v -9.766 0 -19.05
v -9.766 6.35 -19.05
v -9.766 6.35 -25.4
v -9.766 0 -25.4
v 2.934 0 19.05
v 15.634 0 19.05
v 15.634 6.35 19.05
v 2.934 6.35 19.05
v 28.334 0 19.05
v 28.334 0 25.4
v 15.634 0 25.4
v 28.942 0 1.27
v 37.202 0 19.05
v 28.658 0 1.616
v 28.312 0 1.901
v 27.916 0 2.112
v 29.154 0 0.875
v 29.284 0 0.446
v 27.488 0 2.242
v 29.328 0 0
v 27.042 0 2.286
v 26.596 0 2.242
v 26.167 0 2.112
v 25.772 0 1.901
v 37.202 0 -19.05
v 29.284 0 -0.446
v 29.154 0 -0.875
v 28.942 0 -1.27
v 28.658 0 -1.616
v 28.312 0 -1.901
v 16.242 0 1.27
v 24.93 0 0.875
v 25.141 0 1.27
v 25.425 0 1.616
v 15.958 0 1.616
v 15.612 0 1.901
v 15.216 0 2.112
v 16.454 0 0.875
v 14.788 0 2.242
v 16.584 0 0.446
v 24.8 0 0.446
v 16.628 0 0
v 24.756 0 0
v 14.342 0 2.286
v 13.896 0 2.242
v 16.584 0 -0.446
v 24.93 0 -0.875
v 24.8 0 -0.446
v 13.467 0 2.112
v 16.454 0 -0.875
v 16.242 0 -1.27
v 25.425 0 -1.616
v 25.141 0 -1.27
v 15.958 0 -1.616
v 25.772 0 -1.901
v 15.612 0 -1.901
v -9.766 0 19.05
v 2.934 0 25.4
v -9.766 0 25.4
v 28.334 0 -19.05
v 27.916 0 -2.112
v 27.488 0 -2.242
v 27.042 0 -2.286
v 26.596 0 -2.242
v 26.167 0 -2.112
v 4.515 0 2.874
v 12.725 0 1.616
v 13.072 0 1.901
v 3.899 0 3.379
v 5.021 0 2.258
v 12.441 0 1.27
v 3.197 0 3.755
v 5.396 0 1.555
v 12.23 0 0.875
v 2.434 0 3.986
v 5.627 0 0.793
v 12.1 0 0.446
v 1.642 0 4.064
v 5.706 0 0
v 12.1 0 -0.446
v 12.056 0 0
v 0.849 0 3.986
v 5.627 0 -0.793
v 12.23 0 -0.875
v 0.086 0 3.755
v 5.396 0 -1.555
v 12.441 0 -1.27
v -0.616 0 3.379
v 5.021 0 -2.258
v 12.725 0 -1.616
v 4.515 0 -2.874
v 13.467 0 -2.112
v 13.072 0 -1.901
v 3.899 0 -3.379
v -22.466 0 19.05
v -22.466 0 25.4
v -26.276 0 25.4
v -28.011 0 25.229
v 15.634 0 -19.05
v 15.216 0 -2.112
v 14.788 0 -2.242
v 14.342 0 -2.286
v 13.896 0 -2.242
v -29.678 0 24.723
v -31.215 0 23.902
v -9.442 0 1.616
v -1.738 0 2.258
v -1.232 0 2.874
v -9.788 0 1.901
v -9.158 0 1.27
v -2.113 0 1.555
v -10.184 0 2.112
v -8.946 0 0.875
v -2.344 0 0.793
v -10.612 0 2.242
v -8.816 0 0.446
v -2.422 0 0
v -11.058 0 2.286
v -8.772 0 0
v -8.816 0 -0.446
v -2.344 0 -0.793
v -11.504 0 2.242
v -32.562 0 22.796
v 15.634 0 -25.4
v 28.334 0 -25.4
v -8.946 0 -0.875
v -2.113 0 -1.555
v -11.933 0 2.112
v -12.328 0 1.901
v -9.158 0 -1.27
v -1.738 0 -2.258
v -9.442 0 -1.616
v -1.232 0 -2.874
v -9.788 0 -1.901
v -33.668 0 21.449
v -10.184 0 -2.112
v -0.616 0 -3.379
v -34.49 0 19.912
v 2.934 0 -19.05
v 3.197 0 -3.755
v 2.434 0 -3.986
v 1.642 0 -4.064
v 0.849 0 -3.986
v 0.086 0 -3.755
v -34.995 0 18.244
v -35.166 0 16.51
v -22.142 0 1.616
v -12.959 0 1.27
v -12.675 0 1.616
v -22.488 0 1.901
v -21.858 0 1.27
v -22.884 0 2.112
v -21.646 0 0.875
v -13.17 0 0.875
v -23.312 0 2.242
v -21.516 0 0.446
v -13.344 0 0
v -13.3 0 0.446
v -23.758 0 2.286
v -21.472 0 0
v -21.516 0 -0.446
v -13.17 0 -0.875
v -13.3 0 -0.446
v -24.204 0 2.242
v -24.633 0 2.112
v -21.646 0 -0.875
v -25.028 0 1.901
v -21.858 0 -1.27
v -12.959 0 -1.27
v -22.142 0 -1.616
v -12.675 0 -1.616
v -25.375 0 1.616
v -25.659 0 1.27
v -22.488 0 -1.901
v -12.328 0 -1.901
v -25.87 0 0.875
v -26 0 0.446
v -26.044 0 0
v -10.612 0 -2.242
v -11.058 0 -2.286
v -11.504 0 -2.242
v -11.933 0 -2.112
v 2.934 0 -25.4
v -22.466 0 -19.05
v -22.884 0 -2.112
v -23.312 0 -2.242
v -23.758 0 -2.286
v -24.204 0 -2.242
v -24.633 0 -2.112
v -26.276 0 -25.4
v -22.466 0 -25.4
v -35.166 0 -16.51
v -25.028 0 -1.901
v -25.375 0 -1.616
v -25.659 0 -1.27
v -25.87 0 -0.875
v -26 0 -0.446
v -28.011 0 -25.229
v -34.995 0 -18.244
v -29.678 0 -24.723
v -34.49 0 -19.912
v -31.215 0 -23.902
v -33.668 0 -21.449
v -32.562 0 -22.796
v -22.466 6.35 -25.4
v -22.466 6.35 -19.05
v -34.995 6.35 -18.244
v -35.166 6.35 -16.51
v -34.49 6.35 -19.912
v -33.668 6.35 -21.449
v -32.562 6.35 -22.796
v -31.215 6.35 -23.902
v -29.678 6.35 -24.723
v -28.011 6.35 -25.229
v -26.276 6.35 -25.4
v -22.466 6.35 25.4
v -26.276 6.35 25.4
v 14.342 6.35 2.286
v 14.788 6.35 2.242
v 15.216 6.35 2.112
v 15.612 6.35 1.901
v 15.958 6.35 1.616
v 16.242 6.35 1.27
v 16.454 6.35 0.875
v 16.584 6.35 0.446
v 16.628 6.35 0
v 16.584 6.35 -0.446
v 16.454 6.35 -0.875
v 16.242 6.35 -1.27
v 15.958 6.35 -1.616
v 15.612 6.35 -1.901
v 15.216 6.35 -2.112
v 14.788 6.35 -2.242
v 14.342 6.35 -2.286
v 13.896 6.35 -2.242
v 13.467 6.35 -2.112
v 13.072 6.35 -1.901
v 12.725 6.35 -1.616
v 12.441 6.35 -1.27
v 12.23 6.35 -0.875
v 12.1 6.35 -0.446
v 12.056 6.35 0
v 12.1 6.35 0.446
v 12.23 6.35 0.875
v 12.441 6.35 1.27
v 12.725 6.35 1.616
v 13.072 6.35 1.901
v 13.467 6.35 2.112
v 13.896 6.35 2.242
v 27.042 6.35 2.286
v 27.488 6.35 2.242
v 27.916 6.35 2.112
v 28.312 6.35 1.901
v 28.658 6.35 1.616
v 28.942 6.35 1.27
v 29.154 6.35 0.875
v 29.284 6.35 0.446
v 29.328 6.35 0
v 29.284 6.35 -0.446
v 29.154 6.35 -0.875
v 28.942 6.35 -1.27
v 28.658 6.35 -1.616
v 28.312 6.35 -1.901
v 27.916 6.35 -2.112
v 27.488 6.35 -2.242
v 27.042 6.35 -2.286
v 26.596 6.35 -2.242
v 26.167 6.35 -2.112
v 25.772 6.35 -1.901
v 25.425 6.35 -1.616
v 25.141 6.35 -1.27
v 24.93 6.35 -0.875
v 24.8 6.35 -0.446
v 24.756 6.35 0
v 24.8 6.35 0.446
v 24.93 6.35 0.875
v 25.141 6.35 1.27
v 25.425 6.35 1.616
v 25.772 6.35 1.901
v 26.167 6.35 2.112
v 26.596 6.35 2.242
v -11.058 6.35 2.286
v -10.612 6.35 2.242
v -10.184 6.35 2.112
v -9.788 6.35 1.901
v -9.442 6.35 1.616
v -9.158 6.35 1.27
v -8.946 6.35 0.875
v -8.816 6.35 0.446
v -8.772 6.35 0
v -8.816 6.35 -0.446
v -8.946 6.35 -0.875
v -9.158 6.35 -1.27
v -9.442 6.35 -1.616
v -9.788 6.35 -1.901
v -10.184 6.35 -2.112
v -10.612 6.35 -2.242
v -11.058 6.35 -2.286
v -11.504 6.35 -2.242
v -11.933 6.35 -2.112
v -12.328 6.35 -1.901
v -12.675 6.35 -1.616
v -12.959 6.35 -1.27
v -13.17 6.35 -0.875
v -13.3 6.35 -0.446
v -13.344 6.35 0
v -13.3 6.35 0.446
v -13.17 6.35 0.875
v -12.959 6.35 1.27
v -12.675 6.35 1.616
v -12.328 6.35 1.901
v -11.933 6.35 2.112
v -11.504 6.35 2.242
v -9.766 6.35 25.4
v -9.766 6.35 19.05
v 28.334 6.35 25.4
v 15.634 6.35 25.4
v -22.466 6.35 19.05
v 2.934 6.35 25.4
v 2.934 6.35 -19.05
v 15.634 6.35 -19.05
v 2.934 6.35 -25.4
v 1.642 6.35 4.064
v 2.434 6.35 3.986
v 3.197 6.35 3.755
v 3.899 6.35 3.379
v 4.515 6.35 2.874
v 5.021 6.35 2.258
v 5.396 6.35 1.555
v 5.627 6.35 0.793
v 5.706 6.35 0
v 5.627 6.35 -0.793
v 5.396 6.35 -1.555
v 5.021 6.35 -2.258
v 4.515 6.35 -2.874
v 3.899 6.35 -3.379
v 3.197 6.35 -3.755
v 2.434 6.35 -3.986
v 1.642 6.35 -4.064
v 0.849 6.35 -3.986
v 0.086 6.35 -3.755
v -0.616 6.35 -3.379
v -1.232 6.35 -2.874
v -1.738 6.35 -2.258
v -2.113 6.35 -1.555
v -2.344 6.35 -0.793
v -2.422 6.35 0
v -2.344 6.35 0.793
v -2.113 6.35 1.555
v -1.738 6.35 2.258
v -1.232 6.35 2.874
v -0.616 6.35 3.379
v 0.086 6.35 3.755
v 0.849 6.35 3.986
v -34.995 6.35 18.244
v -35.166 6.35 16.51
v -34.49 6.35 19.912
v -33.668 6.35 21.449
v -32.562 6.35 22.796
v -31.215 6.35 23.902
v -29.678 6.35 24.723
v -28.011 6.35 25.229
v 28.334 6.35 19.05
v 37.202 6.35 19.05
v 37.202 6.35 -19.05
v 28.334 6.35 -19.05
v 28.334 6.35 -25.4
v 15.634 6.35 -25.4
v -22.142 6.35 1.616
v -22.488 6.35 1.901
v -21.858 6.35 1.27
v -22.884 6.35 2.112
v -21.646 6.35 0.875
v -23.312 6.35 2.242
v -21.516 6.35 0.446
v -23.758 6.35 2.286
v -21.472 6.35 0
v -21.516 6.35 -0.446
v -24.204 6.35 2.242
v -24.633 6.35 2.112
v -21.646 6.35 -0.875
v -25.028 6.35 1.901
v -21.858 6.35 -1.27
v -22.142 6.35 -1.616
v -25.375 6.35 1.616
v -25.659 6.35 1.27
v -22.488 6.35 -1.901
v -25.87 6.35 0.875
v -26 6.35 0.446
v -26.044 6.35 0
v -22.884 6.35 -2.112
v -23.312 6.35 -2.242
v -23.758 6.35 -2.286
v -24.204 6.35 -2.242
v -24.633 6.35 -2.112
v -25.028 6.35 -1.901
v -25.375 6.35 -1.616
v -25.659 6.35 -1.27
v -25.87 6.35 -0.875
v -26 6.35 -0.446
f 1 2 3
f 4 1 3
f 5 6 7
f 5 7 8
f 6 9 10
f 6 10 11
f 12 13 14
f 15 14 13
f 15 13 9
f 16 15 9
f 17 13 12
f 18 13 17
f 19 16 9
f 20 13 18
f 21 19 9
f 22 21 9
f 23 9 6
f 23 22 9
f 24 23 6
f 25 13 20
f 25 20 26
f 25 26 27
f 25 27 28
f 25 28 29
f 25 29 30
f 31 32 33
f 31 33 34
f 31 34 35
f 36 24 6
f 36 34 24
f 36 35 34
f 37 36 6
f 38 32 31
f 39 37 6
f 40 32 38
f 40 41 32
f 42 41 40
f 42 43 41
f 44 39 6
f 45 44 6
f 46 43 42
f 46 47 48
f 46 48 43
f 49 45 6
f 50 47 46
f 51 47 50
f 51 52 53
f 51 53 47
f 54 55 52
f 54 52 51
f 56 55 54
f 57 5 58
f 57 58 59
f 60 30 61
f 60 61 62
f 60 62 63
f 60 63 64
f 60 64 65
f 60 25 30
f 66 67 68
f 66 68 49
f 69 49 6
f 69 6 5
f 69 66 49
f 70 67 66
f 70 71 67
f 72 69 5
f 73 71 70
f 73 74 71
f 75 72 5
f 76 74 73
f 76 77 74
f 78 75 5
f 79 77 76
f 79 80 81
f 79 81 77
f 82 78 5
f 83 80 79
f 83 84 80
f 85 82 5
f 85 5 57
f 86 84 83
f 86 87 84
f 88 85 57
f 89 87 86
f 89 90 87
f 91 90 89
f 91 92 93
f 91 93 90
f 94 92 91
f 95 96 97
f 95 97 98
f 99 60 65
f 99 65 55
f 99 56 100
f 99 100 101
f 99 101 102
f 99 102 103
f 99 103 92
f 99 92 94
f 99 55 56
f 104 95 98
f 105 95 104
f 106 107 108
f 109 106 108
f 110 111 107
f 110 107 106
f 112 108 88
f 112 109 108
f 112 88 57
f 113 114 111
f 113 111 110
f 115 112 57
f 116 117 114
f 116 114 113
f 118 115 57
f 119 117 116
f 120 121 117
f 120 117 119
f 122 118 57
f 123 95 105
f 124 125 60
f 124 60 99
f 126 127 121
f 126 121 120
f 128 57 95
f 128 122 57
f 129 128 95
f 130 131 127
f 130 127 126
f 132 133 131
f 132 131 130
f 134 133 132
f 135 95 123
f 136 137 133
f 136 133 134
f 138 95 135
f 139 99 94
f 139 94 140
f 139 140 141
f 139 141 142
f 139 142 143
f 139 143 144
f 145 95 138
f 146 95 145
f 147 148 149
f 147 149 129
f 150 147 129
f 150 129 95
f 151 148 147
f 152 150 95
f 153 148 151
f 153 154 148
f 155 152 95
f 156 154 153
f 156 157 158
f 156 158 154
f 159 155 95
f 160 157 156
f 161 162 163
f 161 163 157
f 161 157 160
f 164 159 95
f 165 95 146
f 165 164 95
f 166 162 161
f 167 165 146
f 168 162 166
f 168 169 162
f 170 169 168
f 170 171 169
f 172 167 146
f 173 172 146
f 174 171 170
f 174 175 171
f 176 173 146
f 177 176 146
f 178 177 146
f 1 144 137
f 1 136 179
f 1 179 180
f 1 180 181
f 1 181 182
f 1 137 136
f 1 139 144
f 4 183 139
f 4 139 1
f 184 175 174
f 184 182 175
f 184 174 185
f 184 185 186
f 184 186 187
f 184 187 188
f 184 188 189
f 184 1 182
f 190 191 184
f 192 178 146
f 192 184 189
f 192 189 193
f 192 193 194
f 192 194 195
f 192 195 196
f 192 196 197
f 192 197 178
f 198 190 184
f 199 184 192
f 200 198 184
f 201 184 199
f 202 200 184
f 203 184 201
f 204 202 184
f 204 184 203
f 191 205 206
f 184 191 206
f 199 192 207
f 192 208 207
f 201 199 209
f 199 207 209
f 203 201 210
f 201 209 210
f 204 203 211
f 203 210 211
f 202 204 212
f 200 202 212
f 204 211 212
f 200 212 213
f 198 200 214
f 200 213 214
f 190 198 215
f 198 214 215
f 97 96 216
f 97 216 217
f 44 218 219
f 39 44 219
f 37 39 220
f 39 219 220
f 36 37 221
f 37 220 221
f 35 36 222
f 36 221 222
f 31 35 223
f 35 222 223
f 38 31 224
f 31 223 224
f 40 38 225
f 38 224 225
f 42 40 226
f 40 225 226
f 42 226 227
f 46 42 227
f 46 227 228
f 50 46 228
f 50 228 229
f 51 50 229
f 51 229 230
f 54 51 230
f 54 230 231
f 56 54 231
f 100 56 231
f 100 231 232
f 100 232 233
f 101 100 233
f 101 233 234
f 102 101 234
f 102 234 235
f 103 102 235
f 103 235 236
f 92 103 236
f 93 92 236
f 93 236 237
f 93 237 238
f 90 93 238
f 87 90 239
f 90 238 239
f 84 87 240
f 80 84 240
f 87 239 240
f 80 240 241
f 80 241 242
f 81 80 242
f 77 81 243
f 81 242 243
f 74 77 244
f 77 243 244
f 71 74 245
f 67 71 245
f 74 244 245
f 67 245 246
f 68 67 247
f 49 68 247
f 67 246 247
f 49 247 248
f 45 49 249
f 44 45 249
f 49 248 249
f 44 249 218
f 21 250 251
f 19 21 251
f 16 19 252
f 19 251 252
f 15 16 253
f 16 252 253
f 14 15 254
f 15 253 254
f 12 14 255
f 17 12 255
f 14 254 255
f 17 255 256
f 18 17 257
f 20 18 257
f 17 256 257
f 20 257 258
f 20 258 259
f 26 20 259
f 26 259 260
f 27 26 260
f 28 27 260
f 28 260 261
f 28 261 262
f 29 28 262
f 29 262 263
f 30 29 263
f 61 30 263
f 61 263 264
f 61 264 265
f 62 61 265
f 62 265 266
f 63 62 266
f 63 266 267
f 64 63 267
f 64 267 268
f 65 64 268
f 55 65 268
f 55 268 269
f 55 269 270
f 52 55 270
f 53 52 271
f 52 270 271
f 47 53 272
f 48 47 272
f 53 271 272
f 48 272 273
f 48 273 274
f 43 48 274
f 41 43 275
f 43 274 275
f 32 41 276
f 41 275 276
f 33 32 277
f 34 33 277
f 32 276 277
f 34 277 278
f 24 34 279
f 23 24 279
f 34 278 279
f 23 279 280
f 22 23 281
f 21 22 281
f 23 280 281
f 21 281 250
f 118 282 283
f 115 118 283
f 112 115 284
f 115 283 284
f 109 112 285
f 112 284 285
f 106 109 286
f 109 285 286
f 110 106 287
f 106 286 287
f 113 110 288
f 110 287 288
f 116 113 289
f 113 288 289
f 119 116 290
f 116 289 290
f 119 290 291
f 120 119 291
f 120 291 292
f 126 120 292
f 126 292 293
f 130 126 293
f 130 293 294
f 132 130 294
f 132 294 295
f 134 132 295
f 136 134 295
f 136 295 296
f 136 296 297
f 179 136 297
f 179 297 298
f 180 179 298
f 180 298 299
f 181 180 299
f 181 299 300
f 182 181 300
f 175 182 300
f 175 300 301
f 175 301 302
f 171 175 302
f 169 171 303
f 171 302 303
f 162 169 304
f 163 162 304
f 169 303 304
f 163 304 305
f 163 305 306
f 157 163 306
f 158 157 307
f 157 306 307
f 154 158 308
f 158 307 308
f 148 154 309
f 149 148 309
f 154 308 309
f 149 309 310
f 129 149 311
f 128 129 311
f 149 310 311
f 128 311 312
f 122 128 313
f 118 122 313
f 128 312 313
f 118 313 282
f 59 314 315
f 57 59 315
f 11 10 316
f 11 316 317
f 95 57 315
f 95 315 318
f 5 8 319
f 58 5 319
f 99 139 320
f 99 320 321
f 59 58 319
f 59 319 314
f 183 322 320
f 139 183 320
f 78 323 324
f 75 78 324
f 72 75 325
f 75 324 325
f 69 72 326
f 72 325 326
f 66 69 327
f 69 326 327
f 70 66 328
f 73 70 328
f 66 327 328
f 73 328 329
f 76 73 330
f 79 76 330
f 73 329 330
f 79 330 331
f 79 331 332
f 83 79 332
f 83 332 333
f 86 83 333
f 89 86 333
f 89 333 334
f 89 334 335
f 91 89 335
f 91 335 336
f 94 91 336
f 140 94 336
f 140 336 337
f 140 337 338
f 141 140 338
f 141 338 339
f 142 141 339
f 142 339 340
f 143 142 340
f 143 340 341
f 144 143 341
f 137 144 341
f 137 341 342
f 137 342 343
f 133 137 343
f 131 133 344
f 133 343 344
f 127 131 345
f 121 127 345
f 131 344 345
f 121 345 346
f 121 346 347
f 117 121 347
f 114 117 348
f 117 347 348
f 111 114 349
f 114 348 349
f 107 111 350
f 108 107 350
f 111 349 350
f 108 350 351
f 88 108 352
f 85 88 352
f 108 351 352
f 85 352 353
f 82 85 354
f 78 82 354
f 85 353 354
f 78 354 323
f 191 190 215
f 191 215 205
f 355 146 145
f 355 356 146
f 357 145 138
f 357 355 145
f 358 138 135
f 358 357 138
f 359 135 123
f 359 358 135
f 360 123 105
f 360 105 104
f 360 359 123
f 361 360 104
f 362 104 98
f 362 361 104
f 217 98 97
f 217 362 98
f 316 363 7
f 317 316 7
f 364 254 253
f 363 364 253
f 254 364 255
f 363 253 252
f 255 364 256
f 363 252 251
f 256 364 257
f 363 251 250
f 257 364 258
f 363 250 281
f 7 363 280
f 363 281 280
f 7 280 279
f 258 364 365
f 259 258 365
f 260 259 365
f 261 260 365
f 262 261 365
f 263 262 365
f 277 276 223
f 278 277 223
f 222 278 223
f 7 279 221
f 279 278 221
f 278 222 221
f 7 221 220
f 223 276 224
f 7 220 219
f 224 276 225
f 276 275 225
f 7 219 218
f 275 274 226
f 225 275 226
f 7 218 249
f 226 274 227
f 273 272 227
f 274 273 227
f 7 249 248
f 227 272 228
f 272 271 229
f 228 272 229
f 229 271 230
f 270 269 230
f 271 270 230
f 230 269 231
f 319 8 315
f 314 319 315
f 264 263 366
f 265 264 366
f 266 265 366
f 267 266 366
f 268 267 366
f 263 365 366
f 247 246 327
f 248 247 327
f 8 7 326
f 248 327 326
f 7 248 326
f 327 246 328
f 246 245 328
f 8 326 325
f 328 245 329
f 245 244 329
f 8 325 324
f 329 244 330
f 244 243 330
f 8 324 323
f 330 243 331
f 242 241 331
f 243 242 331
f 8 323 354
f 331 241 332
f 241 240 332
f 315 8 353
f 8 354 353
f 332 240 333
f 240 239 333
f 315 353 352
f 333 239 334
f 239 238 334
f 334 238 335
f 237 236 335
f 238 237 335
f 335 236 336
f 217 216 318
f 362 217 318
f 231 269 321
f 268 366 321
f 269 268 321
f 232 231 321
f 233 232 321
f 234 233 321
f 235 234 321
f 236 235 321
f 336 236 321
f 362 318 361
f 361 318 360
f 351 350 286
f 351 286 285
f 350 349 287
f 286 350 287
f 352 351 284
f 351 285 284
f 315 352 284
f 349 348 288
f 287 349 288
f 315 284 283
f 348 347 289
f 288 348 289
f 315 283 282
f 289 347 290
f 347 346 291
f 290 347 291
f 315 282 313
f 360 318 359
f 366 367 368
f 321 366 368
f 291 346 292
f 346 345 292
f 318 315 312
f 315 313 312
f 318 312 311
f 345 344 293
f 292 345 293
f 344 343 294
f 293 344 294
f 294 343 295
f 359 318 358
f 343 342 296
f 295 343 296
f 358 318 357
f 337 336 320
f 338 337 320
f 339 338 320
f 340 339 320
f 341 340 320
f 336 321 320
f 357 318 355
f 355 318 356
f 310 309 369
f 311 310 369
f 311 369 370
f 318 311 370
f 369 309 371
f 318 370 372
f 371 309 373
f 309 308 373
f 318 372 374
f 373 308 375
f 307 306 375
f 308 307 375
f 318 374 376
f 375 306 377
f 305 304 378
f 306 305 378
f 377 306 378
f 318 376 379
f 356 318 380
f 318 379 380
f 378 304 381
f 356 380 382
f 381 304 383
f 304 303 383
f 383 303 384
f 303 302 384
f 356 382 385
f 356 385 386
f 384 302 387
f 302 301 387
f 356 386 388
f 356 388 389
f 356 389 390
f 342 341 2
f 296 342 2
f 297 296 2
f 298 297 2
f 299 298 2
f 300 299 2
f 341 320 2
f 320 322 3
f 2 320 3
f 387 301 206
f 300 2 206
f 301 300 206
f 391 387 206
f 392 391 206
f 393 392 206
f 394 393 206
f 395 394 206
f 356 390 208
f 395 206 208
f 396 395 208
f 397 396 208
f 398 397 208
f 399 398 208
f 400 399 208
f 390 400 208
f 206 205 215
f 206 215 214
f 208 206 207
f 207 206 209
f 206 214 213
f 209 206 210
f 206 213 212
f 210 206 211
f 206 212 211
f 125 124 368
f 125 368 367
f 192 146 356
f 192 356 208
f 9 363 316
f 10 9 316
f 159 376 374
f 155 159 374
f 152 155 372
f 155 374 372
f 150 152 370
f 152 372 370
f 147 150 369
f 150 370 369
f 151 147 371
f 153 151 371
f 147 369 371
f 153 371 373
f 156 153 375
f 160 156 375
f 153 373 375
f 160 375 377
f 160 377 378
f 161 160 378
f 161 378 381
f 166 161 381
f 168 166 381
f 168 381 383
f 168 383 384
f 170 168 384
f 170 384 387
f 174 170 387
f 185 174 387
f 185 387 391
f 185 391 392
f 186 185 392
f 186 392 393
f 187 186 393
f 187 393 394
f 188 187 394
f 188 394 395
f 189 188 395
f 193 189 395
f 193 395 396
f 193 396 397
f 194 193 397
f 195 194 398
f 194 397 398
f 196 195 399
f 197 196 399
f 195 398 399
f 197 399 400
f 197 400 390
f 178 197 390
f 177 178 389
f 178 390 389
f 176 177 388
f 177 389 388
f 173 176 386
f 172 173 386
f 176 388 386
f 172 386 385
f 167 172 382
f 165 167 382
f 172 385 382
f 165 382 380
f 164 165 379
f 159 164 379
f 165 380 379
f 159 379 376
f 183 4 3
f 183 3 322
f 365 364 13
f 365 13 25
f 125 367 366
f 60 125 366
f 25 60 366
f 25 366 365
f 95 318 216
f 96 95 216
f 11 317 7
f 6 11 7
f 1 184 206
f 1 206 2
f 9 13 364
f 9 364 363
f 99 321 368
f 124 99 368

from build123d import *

# Parameters (mm, degrees)
MAIN_DEPTH             = 6.35
SKETCH3_R              = 4.064
SKETCH3_R_2            = 2.286
GEAR_MOUNT_HOLES_DEPTH = 51.497474194
SKETCH4_W              = 5.978415147
SKETCH4_H              = 38.1
SKETCH4_W_2            = 8.0137
CUT_EXTRUDE2_DEPTH     = 51.497474194
FILLET1_R              = 8.89


with BuildPart() as part:
    # Sketch1 → Main (new body)
    with BuildSketch(Plane(origin=(0, 0, 0), x_dir=(1, 0, 0), z_dir=(0, 1, 0))):
        Polygon((-43.18, 19.05), (-35.1663, 19.05), (-35.1663, 25.4), (-22.4663, 25.4), (-22.4663, 19.05), (-9.7663, 19.05), (-9.7663, 25.4), (2.9337, 25.4), (2.9337, 19.05), (15.6337, 19.05), (15.6337, 25.4), (28.3337, 25.4), (28.3337, 19.05), (43.18, 19.05), (43.18, -19.05), (28.3337, -19.05), (28.3337, -25.4), (15.6337, -25.4), (15.6337, -19.05), (2.9337, -19.05), (2.9337, -25.4), (-9.7663, -25.4), (-9.7663, -19.05), (-22.4663, -19.05), (-22.4663, -25.4), (-35.1663, -25.4), (-35.1663, -19.05), (-43.18, -19.05), align=None)
    extrude(amount=MAIN_DEPTH)

    # Sketch3 → Gear Mount Holes (cut, through all)
    with BuildSketch(Plane(origin=(0, 6.35, 0), x_dir=(1, 0, 0), z_dir=(0, 1, 0))):
        with Locations(Location((1.641584853, 0, 0), (0, 0, 270))):
            Circle(SKETCH3_R)
        with Locations(Location((14.341584853, 0, 0), (0, 0, 270))):
            Circle(SKETCH3_R_2)
        with Locations(Location((27.041584853, 0, 0), (0, 0, 270))):
            Circle(SKETCH3_R_2)
        with Locations(Location((-11.058415147, 0, 0), (0, 0, 270))):
            Circle(SKETCH3_R_2)
        with Locations(Location((-23.758415147, 0, 0), (0, 0, 270))):
            Circle(SKETCH3_R_2)
    extrude(amount=-GEAR_MOUNT_HOLES_DEPTH, mode=Mode.SUBTRACT)

    # Sketch4 → Cut-Extrude2 (cut, through all)
    with BuildSketch(Plane(origin=(0, 6.35, 0), x_dir=(1, 0, 0), z_dir=(0, 1, 0))):
        with Locations((40.190792426, 0)):
            Rectangle(SKETCH4_W, SKETCH4_H)
        with Locations((-39.17315, 0)):
            Rectangle(SKETCH4_W_2, SKETCH4_H)
    extrude(amount=-CUT_EXTRUDE2_DEPTH, mode=Mode.SUBTRACT)

    # Fillet1
    fillet1_edges = [part.edges().sort_by_distance(p)[0] for p in [
        (-35.1663, 3.175, -25.4),
        (-35.1663, 3.175, 25.4),
    ]]
    fillet(fillet1_edges, radius=FILLET1_R)


solid = part.part
